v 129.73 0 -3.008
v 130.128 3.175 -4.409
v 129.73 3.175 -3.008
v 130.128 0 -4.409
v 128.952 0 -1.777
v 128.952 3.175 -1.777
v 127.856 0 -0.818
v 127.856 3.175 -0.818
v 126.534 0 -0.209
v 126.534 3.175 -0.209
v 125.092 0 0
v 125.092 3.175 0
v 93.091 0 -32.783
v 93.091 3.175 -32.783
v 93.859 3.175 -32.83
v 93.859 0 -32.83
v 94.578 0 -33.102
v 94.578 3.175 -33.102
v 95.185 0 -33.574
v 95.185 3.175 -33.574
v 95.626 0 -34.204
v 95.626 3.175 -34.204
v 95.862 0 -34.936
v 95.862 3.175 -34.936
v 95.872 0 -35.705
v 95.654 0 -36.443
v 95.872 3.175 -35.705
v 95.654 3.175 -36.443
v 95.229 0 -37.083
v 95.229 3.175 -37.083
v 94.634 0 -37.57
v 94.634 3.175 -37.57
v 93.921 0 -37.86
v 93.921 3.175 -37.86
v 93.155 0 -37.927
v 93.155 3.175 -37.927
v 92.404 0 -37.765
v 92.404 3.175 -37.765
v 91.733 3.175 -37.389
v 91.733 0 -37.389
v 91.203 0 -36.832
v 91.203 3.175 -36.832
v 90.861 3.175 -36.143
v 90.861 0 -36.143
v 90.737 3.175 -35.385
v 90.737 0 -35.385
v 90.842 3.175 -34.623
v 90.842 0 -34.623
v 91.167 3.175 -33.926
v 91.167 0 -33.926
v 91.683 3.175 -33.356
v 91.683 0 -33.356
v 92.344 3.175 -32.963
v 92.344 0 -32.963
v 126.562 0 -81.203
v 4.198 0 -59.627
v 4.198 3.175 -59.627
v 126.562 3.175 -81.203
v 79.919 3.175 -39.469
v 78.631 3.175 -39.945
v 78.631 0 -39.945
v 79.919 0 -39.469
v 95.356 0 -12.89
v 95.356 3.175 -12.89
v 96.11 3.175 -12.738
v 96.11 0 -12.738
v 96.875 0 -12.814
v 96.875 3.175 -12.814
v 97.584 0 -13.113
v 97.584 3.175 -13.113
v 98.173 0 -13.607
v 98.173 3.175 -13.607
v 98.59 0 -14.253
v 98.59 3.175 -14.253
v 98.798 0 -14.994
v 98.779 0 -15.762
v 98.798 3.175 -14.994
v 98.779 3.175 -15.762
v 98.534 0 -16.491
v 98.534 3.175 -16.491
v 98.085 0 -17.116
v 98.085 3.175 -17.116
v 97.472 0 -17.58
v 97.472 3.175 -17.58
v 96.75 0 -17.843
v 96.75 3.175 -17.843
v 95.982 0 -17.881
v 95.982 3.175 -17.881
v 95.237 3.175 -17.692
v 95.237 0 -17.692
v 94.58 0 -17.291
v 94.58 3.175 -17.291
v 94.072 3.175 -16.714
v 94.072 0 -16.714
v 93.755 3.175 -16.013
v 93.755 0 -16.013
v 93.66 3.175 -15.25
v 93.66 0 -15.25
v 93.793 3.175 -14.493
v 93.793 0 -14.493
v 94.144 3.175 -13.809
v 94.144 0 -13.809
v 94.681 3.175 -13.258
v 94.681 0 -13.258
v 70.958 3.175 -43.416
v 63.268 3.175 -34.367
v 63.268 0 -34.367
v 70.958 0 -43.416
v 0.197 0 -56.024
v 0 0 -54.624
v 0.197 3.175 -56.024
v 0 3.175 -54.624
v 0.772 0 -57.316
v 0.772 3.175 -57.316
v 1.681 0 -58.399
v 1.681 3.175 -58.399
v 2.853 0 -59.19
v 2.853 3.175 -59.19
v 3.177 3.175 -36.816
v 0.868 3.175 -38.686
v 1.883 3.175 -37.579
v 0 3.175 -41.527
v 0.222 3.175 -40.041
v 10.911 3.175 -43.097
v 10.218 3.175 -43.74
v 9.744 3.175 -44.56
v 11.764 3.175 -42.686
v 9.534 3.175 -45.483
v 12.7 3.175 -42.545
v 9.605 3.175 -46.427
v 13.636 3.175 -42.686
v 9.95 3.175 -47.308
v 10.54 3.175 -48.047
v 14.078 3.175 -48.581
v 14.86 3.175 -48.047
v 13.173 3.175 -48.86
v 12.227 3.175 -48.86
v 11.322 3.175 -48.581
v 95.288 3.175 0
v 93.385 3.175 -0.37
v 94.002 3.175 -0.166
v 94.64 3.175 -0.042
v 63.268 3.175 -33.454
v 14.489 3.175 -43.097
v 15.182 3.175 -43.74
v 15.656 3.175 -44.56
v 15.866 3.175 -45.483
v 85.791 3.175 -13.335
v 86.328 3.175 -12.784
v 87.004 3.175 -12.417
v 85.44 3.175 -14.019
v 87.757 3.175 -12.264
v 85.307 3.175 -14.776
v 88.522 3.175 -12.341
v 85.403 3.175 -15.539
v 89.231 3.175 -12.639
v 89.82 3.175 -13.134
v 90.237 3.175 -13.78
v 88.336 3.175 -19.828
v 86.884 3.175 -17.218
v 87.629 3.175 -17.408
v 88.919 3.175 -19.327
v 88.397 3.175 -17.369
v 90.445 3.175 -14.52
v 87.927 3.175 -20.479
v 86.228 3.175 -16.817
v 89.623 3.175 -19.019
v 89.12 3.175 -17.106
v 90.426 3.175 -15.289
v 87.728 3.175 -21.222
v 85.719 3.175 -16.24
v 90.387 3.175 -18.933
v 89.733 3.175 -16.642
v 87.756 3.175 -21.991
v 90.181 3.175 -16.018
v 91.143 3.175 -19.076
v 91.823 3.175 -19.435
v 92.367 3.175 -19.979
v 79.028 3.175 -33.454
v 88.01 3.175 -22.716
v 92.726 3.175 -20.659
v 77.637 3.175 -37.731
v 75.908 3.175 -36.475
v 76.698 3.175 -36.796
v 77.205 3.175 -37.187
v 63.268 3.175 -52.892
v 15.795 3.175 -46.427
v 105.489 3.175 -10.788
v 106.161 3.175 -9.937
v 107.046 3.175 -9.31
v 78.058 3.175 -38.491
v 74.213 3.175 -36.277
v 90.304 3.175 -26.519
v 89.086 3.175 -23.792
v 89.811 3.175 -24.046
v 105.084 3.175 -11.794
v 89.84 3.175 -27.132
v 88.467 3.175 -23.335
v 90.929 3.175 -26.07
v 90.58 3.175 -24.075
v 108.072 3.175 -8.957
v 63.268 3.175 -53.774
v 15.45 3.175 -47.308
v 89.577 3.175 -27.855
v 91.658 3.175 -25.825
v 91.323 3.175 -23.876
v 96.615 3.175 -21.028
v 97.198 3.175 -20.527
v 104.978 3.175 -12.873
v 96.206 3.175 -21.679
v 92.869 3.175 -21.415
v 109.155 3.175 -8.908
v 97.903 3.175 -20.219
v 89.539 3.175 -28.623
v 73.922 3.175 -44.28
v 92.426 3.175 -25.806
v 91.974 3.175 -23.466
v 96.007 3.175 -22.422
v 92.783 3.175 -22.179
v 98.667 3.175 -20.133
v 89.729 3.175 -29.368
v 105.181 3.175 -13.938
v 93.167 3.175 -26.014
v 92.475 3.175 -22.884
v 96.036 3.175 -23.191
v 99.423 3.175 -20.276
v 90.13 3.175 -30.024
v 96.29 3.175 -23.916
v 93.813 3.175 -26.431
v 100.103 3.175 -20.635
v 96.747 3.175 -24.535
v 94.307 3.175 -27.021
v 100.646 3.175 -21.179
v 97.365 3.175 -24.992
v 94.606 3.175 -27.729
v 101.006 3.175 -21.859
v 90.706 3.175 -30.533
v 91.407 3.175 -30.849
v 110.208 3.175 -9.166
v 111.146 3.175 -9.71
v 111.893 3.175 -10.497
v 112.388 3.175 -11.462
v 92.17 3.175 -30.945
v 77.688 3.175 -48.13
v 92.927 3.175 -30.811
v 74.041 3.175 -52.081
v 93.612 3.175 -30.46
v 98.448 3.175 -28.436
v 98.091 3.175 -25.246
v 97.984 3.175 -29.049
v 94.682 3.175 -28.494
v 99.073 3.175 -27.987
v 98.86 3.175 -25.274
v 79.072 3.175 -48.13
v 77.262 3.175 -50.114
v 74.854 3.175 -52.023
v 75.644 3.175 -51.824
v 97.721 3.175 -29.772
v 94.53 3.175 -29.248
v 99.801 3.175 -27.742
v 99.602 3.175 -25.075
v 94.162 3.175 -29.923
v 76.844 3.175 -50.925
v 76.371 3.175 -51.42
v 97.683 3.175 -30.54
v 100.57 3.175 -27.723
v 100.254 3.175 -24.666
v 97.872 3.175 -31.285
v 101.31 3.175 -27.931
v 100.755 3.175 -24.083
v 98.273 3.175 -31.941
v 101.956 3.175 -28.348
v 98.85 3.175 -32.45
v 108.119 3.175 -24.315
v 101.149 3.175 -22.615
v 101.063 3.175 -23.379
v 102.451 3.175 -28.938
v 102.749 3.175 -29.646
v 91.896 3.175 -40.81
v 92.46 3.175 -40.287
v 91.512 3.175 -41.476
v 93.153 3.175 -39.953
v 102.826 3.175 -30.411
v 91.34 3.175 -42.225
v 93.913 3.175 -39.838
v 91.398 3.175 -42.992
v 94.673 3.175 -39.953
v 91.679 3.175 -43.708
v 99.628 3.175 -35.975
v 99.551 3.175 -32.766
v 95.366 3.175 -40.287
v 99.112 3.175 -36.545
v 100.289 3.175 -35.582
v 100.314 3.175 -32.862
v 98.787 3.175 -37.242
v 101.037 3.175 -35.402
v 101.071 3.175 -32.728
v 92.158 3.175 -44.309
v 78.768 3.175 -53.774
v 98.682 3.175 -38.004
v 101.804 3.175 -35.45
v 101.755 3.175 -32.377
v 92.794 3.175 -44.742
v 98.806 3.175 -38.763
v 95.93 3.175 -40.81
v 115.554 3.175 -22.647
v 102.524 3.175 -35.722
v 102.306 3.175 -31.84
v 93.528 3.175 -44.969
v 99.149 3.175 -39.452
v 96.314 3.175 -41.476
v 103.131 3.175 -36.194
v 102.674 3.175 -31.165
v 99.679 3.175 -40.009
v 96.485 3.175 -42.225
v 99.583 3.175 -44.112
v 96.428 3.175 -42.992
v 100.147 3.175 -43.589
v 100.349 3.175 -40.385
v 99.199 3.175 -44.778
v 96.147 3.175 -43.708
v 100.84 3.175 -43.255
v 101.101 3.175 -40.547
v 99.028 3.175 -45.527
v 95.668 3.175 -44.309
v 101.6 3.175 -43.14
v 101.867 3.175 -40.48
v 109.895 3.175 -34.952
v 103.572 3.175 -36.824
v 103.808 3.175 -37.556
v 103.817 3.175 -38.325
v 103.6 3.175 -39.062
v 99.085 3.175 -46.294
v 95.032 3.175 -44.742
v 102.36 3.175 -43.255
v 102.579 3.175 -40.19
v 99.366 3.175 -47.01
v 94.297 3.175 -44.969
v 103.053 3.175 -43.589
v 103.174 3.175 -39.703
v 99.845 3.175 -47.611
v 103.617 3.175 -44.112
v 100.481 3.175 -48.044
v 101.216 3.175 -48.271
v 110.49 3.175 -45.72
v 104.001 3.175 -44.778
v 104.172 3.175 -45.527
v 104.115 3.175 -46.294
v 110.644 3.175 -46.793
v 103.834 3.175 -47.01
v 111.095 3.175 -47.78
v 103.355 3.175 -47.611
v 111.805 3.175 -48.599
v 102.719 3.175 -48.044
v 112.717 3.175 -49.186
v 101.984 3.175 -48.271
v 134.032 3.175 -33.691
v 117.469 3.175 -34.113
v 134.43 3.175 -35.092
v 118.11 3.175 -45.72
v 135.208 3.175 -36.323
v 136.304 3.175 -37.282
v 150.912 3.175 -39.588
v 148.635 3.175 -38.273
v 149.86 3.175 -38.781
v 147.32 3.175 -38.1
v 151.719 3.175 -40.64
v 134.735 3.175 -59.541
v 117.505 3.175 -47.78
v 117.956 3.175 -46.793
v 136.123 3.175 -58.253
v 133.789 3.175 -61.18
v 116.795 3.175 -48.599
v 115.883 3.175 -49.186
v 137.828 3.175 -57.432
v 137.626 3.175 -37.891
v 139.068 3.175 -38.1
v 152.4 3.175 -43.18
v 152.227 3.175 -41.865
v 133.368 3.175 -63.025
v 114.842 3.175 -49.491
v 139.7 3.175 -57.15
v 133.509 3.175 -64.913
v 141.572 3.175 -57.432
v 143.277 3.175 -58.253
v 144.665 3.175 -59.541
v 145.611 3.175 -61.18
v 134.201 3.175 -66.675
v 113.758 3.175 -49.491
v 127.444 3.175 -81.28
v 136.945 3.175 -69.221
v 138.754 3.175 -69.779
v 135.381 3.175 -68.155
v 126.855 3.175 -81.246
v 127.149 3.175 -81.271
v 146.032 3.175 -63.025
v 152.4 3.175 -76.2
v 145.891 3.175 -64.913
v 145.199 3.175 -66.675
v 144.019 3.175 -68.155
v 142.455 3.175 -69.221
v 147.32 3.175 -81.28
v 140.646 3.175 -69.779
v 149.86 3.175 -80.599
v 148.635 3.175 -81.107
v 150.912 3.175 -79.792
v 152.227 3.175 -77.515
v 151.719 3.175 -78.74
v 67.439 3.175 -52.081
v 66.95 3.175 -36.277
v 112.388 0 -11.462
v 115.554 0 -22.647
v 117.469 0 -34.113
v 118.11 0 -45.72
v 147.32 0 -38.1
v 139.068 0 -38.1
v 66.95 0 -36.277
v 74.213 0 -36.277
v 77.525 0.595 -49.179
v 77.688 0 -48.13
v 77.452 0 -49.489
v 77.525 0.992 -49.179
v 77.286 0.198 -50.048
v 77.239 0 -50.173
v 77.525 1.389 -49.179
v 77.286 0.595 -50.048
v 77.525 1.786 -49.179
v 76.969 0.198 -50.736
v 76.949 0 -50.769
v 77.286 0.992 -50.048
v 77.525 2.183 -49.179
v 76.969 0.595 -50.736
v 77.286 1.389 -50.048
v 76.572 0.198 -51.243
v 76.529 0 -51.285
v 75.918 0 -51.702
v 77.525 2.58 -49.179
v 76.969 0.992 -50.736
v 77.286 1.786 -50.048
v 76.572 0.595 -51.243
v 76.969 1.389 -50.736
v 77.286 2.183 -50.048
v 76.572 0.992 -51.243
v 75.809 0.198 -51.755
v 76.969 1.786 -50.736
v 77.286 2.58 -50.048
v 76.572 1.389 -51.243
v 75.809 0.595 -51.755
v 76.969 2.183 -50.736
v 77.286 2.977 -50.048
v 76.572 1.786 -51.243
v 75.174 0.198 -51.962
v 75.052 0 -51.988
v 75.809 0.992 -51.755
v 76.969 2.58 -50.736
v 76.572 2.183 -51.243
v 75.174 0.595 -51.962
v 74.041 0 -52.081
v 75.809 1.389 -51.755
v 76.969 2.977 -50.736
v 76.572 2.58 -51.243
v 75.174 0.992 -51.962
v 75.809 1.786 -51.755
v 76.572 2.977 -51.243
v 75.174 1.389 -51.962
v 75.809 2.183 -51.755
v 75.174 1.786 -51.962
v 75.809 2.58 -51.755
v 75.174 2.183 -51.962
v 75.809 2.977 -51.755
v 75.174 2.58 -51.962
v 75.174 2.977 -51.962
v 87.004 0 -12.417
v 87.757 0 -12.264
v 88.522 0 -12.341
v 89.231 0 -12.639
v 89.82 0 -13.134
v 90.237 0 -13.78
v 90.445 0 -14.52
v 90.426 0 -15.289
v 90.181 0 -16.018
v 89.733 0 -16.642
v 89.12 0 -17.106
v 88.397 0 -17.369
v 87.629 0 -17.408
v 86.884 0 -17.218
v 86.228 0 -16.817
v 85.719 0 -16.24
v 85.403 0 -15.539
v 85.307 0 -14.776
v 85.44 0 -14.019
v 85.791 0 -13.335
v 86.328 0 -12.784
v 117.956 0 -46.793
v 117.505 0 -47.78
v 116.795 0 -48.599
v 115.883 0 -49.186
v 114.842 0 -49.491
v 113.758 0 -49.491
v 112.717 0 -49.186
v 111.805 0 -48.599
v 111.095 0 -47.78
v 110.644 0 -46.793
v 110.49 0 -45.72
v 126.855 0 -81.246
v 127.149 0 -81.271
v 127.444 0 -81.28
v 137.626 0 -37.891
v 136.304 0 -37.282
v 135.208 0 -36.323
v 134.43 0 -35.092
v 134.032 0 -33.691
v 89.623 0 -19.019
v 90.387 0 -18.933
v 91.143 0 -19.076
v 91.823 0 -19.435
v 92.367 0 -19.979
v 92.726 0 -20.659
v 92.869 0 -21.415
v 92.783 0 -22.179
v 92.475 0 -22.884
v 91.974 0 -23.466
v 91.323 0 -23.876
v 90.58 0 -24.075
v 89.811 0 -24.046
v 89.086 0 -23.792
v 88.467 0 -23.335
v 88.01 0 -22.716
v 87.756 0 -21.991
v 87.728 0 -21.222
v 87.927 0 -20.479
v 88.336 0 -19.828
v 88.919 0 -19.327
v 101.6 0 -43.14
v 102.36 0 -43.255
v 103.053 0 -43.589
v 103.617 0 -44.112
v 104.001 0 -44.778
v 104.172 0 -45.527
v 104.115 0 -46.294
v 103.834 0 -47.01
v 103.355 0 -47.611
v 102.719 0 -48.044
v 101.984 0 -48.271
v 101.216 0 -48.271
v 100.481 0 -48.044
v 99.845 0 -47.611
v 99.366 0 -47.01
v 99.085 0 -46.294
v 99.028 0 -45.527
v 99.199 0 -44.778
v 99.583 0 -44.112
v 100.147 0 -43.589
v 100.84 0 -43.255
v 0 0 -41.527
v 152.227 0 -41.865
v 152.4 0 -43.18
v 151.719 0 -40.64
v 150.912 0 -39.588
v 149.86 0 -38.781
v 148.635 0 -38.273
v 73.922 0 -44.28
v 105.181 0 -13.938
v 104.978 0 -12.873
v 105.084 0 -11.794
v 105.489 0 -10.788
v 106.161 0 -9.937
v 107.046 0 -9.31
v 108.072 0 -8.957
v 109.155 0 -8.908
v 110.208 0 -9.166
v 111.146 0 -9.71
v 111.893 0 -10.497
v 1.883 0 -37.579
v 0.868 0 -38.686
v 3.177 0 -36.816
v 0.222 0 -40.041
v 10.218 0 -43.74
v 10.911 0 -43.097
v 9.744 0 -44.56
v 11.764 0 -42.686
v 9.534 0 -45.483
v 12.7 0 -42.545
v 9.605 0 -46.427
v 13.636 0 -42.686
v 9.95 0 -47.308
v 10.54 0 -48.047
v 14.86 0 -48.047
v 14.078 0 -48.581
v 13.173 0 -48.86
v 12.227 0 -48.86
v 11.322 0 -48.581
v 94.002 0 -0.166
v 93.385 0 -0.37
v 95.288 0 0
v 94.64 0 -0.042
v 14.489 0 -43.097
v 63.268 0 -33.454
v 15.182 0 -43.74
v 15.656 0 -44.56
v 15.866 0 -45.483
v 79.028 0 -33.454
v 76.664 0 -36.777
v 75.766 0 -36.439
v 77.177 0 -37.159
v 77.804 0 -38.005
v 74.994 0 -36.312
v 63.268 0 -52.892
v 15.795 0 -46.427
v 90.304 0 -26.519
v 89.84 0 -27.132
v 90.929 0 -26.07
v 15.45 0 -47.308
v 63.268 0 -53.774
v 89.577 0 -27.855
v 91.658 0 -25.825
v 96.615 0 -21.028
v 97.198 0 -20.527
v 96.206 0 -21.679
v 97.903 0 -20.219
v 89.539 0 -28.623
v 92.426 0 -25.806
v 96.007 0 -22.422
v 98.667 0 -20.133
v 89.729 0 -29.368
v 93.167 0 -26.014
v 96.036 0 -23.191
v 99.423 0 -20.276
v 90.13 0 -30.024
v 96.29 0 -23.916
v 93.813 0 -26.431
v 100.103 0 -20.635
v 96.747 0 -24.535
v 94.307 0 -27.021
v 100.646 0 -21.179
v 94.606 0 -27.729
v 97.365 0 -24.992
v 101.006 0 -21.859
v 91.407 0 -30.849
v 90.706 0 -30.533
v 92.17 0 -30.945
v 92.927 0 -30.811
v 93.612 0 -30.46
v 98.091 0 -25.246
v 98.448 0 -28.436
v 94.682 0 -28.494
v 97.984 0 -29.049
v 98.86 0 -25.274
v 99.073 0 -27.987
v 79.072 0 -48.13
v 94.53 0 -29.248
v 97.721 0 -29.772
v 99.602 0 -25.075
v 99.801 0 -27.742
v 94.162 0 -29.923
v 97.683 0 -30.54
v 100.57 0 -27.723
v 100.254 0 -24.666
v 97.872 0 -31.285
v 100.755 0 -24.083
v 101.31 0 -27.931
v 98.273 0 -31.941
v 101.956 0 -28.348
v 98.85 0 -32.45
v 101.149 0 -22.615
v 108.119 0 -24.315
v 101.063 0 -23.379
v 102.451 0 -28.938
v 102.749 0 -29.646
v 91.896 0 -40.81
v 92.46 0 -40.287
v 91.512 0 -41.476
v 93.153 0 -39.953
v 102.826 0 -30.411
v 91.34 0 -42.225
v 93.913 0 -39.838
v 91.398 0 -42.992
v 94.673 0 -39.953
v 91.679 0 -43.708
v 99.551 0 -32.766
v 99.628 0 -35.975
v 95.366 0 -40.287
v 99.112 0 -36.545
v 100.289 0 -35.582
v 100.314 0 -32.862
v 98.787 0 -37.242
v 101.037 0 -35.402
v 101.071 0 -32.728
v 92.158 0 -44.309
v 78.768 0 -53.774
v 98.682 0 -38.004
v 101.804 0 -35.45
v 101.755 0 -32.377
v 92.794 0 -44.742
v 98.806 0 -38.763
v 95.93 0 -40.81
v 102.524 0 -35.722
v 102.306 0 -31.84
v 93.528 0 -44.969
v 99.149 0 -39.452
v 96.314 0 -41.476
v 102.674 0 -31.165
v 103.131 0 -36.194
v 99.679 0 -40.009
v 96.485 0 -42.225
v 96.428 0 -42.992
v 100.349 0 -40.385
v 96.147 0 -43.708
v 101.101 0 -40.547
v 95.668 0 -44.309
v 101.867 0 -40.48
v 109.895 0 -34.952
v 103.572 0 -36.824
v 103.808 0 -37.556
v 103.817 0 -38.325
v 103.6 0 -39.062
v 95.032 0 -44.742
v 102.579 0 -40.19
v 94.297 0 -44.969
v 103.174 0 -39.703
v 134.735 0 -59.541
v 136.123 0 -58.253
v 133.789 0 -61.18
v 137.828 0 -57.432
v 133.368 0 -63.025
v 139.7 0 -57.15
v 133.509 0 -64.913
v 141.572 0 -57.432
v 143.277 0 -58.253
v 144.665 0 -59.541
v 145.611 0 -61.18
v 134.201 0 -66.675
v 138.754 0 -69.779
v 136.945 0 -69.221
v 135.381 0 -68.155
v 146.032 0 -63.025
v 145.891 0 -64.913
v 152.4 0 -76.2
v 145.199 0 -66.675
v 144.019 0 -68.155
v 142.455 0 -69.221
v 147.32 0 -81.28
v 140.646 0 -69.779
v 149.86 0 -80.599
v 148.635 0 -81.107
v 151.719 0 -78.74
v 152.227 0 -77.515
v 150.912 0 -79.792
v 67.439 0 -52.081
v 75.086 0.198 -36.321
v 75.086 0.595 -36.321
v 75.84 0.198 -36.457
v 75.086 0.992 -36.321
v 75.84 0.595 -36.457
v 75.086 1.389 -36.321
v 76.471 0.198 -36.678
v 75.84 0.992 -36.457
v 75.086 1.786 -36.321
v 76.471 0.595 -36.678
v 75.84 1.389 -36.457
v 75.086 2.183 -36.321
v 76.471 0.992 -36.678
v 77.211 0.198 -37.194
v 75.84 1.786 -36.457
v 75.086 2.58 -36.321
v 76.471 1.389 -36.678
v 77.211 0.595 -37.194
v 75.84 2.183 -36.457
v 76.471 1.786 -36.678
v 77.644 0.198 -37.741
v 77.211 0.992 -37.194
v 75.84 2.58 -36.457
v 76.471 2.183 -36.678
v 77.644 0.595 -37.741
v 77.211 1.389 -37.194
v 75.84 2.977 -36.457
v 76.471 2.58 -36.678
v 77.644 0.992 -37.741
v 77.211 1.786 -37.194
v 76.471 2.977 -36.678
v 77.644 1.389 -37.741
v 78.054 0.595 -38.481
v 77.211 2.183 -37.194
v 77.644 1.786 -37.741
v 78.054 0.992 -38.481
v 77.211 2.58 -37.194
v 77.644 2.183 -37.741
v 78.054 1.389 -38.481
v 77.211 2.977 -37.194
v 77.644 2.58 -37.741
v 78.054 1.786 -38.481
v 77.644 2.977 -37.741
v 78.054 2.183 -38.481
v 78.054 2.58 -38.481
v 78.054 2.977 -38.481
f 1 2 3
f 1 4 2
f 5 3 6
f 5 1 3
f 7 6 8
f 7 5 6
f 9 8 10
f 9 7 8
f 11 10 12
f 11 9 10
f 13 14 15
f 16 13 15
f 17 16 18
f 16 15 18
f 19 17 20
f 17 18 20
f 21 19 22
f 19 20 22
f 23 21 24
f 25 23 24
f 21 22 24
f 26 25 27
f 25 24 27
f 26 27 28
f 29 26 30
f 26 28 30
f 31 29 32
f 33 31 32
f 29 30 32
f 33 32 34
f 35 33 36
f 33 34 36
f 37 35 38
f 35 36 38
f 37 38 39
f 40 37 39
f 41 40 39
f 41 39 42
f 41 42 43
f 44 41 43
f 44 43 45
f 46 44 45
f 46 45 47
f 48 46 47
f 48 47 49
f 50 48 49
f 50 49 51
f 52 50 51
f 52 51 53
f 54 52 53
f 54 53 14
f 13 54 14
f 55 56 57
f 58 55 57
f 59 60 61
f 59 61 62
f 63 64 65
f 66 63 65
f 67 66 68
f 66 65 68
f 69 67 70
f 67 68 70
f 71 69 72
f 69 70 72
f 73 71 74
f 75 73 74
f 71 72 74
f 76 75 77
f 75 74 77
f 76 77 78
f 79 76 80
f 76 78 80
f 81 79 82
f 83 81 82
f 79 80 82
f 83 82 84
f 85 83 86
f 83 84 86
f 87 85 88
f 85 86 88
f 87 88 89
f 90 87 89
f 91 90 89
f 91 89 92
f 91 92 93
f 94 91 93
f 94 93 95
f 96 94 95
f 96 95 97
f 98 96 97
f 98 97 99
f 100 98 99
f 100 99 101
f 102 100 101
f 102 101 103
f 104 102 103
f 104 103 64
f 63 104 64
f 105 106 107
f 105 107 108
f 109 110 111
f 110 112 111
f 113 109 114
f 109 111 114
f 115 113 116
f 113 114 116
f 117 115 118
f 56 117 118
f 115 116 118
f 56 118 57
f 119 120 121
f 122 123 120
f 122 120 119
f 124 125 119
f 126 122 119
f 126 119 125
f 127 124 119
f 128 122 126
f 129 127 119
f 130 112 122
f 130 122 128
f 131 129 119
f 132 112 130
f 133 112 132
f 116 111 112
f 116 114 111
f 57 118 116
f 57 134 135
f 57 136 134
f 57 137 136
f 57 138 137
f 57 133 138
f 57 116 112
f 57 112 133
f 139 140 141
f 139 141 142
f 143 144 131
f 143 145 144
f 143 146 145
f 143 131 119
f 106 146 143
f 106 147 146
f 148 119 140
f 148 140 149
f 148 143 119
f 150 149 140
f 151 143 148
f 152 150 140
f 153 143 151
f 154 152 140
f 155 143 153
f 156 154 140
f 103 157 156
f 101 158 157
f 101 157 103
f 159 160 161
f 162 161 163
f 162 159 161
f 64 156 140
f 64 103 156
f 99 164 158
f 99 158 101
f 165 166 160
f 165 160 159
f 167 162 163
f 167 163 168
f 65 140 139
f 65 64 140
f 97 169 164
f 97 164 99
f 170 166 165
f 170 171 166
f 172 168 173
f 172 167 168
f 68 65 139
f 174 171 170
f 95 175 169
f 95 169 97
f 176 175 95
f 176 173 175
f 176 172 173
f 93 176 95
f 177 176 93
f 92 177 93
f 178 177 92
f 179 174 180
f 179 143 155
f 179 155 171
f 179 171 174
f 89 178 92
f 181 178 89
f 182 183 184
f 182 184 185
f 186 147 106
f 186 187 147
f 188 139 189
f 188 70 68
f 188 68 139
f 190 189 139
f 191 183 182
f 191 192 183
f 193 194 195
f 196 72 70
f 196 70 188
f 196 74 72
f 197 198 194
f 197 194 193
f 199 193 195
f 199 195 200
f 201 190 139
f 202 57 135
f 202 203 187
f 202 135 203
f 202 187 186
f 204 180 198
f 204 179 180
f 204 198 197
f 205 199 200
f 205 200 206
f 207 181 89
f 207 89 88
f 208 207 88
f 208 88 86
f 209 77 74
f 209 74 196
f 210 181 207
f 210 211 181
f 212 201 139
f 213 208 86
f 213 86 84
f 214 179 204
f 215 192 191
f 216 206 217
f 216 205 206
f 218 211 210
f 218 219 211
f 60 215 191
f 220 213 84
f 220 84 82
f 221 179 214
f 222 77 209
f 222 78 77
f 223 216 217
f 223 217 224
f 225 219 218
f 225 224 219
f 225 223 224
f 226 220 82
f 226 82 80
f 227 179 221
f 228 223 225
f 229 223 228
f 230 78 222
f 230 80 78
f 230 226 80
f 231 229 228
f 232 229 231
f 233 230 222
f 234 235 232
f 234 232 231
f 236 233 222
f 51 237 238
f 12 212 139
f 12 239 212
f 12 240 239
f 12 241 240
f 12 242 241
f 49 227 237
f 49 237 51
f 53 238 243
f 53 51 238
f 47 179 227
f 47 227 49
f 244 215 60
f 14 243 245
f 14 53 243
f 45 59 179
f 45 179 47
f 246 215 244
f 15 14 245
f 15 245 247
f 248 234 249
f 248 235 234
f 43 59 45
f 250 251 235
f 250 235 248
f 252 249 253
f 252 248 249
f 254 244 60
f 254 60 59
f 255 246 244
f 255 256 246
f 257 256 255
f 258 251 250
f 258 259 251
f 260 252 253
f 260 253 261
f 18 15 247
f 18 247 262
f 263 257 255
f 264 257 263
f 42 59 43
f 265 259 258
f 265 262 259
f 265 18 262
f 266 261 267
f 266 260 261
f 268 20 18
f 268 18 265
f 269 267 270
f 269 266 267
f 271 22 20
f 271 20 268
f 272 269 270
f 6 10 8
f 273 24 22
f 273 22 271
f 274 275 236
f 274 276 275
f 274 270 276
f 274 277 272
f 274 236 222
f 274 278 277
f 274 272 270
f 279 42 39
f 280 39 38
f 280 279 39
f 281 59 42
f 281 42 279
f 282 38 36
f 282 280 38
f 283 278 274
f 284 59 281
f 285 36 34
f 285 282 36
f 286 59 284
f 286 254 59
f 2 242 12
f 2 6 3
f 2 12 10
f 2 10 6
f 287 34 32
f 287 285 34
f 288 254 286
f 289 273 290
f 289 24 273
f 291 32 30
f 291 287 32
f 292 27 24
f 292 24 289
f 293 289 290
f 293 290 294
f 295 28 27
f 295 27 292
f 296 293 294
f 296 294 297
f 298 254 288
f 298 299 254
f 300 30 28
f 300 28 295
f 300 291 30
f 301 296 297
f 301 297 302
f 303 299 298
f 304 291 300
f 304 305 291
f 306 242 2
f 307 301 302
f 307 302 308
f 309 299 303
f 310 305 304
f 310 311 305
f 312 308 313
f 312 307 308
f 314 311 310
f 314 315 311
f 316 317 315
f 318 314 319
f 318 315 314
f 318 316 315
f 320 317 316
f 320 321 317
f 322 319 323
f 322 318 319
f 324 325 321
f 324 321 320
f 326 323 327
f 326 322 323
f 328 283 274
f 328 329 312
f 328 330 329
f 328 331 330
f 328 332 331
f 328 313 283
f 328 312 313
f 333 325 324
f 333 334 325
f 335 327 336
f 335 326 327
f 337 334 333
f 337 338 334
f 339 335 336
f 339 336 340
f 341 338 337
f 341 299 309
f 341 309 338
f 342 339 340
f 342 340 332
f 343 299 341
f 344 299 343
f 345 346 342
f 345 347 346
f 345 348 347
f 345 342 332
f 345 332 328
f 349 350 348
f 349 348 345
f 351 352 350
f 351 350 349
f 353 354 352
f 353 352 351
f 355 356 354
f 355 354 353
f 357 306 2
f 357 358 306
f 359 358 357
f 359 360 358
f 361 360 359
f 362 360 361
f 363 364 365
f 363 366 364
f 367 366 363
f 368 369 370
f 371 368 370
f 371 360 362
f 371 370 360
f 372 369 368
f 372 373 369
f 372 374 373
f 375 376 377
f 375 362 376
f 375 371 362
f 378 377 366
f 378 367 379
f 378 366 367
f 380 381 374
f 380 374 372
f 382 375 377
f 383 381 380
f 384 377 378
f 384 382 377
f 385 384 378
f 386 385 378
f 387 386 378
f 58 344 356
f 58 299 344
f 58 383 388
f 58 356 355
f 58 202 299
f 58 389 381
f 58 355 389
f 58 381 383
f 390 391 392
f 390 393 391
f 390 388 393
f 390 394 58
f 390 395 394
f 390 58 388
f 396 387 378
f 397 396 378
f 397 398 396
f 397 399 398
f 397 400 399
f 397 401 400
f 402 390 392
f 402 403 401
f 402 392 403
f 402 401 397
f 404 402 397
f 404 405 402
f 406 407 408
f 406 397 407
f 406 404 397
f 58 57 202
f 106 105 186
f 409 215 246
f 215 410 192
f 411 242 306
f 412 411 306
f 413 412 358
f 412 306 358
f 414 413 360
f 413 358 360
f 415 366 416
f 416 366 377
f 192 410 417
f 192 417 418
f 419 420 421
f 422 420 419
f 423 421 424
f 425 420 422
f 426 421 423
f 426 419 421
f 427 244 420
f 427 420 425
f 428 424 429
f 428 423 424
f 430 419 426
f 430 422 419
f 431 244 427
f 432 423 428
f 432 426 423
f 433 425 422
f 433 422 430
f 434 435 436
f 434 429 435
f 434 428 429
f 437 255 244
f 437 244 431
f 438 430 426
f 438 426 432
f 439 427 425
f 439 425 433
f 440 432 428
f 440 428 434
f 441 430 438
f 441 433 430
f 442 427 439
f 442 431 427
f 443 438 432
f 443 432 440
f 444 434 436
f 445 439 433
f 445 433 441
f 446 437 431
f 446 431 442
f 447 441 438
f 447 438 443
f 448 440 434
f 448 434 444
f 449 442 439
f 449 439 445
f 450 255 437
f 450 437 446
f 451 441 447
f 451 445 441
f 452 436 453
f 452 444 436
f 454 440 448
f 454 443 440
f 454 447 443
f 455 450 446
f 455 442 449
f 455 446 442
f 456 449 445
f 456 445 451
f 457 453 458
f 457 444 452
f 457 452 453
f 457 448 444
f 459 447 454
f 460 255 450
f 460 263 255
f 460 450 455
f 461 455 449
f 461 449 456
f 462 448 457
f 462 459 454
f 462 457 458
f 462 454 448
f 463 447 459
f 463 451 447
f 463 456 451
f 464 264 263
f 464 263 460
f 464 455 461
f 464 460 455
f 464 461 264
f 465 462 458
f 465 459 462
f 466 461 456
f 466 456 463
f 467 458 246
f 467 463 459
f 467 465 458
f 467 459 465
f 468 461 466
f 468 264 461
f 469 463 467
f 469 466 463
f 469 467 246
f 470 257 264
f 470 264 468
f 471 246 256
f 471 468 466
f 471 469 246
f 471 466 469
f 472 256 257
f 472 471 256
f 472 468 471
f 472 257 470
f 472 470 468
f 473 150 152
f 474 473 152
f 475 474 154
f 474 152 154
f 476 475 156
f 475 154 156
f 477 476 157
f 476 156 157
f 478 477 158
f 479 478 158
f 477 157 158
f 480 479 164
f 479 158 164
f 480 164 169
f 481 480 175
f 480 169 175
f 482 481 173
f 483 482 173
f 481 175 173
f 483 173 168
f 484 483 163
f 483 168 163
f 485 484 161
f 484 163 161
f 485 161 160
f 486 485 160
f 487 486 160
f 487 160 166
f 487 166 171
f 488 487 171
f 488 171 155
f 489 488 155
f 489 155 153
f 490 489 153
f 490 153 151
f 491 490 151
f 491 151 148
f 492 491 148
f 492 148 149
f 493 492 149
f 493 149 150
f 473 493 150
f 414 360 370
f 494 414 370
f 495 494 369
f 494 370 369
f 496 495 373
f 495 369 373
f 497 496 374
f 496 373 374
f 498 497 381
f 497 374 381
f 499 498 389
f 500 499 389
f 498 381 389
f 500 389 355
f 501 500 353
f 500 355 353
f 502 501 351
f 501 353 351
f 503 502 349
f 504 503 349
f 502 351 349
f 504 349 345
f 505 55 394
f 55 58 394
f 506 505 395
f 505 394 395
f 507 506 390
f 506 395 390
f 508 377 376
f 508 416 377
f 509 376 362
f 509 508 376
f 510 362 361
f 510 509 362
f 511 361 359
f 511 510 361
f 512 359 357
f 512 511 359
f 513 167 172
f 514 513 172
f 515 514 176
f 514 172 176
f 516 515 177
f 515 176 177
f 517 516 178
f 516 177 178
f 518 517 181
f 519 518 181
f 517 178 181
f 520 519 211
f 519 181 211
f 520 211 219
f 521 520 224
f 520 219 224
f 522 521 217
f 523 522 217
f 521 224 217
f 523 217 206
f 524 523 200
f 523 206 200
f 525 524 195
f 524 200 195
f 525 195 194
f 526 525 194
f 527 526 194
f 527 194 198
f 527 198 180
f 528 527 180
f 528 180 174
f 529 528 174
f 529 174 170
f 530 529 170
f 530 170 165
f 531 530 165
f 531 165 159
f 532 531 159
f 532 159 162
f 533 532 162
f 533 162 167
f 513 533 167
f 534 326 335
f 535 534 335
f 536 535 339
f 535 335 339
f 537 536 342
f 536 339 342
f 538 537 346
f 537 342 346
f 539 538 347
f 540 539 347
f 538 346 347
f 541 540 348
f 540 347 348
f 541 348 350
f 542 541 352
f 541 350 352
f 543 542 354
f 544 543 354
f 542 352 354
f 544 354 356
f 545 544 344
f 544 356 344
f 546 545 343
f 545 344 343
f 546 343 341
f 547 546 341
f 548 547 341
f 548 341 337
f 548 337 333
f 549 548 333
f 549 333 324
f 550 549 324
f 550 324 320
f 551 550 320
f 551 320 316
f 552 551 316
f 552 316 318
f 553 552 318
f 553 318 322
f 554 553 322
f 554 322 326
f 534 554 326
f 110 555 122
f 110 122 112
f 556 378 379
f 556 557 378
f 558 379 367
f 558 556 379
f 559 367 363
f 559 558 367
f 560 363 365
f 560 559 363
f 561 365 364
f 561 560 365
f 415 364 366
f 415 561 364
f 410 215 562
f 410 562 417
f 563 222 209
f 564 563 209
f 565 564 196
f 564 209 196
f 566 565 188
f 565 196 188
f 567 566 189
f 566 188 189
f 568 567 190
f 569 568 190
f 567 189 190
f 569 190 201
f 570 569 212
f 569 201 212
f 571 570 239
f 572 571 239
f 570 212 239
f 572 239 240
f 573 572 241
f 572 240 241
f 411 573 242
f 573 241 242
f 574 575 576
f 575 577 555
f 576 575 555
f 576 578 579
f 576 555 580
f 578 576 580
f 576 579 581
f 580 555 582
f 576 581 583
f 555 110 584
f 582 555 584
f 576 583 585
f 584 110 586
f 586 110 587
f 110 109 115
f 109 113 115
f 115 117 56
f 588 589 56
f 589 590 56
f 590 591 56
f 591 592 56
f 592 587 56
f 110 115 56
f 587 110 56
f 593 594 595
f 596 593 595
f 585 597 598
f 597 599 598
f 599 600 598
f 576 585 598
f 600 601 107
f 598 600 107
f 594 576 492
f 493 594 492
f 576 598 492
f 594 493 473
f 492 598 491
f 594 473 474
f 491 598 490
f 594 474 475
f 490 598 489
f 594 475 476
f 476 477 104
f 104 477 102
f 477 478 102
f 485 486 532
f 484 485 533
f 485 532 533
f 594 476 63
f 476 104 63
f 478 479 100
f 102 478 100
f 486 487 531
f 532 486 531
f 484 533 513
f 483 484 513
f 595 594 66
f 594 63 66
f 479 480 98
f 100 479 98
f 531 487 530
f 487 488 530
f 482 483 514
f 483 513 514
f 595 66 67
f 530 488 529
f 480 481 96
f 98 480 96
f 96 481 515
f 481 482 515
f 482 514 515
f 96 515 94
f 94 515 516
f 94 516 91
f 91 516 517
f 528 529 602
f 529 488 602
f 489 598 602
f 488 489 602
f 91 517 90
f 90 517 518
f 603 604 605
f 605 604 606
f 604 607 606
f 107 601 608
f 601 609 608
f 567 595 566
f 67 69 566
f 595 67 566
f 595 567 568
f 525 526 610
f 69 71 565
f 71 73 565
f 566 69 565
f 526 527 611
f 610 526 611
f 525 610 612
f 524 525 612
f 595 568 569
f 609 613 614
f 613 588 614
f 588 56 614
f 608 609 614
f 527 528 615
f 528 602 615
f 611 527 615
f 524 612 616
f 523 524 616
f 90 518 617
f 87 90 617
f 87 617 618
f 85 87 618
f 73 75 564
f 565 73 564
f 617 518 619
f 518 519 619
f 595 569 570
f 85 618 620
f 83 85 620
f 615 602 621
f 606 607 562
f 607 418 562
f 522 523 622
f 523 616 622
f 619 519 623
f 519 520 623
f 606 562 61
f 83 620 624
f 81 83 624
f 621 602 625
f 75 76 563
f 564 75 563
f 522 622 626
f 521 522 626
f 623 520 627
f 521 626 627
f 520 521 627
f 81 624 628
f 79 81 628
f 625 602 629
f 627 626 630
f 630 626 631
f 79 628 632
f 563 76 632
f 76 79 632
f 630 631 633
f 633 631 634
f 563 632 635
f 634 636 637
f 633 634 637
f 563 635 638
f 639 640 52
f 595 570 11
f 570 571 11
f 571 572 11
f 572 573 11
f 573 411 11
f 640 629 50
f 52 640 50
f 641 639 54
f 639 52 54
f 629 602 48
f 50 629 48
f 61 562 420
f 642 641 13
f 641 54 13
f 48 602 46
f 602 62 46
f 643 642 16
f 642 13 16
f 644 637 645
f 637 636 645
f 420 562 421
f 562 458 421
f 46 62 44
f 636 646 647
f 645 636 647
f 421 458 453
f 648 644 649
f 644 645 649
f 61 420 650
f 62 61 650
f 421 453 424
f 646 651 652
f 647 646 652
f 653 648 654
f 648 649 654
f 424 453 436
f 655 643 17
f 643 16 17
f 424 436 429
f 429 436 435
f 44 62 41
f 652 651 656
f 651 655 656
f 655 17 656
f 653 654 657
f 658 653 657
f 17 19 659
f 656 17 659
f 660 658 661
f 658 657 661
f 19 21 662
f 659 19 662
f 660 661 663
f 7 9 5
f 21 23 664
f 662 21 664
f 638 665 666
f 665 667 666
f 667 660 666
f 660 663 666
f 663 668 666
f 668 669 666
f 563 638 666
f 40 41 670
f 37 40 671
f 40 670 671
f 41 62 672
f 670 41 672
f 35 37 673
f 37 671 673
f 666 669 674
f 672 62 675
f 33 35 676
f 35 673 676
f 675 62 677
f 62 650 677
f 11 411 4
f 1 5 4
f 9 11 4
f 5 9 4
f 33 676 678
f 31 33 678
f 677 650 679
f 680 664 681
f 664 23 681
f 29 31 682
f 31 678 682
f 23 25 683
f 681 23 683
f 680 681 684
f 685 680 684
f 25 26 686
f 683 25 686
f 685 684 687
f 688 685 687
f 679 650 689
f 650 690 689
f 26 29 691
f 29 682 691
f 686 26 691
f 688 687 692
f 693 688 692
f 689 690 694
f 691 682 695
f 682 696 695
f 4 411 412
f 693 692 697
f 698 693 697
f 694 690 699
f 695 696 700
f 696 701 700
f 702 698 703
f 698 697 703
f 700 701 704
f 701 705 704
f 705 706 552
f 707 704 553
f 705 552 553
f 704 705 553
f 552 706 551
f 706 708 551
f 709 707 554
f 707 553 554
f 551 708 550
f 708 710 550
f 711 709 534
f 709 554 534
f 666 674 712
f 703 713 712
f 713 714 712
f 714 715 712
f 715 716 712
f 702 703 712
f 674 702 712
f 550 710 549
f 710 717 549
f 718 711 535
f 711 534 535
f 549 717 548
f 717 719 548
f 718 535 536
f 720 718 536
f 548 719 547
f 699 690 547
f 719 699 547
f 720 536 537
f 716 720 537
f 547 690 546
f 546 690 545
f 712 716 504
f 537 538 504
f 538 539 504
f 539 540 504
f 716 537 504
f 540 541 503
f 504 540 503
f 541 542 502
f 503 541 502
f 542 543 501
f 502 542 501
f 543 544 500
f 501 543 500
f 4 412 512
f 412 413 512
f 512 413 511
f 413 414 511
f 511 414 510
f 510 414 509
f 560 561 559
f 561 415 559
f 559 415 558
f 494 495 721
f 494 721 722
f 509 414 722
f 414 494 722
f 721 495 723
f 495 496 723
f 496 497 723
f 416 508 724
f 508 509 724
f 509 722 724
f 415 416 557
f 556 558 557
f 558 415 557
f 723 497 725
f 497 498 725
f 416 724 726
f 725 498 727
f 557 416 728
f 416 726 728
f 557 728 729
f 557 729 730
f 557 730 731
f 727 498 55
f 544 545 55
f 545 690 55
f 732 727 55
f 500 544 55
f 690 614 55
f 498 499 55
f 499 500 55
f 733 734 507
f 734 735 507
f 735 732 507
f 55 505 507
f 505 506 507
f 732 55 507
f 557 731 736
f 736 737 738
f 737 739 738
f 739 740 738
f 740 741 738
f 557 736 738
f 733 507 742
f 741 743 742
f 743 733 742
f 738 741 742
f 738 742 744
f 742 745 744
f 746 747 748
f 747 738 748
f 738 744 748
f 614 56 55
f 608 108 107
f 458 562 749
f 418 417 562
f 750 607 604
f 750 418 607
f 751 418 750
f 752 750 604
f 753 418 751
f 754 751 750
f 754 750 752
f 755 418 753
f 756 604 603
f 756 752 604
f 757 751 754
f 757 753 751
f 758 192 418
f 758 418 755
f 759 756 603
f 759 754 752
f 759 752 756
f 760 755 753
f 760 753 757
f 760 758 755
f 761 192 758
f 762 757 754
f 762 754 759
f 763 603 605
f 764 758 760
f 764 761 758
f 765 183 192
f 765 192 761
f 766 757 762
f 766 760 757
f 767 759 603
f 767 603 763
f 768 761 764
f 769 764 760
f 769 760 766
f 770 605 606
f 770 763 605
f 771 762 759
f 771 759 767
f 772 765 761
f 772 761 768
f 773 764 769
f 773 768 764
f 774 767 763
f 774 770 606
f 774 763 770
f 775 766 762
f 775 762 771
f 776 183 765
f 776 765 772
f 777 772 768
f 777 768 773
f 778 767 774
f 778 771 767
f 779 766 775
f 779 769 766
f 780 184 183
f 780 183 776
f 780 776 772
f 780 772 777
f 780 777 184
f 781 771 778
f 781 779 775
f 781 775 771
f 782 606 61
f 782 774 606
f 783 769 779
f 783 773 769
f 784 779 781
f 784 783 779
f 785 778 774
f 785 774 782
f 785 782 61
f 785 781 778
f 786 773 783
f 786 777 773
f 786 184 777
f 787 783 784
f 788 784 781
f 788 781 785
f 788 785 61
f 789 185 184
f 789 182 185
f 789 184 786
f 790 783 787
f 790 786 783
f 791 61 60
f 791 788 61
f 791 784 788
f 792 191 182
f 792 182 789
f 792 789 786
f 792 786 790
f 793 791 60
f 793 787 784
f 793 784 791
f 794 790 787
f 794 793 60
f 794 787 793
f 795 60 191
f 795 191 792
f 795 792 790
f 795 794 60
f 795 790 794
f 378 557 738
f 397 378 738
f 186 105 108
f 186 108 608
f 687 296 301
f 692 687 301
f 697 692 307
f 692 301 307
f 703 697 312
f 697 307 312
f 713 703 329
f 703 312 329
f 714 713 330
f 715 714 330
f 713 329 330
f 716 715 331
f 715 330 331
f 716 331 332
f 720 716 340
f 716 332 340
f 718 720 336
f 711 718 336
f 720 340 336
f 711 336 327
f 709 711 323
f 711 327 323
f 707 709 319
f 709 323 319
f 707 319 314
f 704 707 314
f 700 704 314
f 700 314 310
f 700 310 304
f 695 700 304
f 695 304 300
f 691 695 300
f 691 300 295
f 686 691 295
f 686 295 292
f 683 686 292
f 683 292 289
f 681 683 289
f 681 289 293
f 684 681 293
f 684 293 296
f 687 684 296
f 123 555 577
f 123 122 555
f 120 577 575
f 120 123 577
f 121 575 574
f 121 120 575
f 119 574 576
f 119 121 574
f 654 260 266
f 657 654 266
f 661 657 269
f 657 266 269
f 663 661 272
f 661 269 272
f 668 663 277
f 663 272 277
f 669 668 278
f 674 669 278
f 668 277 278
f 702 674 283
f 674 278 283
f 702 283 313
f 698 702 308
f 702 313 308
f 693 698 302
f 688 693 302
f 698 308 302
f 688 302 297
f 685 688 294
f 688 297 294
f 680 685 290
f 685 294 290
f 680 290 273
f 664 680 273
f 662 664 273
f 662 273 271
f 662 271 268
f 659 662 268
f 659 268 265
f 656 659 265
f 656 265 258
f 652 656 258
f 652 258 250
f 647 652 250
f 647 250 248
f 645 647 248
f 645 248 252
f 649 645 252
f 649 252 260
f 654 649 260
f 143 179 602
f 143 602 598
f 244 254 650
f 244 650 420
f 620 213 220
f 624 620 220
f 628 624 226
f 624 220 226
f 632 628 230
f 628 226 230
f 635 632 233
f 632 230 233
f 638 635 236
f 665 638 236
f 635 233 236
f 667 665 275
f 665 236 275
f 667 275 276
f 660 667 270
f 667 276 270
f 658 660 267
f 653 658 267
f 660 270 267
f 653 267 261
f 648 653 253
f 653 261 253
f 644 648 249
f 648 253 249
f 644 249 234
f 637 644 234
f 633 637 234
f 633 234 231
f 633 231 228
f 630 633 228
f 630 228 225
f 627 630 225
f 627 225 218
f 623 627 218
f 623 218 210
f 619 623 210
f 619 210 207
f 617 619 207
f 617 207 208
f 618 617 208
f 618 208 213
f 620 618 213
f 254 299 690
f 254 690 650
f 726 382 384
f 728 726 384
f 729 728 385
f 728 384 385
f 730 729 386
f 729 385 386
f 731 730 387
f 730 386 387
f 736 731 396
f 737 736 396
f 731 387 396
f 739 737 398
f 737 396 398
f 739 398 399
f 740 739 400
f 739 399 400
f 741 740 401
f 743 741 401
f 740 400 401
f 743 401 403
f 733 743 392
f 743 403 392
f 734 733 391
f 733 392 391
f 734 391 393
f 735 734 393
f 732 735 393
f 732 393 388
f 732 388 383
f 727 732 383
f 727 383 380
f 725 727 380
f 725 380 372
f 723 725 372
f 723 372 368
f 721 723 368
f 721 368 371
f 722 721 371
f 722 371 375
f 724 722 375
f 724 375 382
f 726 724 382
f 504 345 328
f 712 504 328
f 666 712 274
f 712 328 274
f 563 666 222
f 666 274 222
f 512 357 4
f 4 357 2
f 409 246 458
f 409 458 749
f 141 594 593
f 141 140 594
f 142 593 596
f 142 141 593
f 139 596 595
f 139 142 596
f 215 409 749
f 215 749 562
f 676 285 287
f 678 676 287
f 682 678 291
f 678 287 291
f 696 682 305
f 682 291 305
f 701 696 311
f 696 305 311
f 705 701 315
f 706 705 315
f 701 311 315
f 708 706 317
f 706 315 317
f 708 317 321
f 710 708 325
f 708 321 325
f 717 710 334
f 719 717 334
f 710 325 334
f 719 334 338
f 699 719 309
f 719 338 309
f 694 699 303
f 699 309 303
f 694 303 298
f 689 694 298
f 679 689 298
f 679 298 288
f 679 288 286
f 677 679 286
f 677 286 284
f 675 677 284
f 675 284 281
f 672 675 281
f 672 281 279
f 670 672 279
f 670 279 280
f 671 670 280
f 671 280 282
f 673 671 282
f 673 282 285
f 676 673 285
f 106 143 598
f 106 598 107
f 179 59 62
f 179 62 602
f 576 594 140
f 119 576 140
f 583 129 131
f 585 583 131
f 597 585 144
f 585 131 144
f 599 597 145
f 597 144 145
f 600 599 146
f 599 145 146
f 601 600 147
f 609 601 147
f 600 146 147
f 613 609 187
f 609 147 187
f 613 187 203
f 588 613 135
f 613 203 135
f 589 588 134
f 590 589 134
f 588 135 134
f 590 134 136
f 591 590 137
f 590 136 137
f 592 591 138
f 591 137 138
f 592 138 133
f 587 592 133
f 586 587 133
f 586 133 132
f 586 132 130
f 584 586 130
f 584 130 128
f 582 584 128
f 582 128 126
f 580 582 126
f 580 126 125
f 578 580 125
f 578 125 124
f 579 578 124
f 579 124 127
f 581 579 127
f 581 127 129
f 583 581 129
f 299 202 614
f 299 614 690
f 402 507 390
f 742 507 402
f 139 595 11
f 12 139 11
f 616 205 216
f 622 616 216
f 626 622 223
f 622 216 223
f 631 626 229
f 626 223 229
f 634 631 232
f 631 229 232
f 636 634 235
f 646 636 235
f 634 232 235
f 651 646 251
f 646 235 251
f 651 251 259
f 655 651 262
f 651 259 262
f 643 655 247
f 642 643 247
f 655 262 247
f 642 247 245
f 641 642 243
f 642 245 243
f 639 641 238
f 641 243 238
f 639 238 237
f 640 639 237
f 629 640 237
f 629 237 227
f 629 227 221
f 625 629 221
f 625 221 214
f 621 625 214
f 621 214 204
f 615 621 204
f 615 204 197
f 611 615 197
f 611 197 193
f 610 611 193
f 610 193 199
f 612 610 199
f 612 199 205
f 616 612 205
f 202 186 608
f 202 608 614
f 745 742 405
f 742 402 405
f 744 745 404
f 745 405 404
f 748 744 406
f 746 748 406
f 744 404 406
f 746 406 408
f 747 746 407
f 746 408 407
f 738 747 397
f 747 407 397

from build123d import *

# Parameters (mm, degrees)
SKETCH1_W           = 152.4
SKETCH1_H           = 81.28
BOSS_EXTRUDE1_DEPTH = 3.175
SKETCH2_R           = 3.175
SKETCH2_R_2         = 6.35
CUT_EXTRUDE1_DEPTH  = 173.74917952
CHAMFER1_SIZE       = 38.1
CHAMFER1_SIZE2      = 94.300809115
CHAMFER2_SIZE       = 127
CHAMFER2_SIZE2      = 22.39352655
CUT_EXTRUDE2_DEPTH  = 173.74917952
FILLET1_R           = 5.08
CUT_EXTRUDE3_DEPTH  = 173.74917952
SKETCH5_R           = 2.5796875
CUT_EXTRUDE4_DEPTH  = 173.749179658
CIRPATTERN1_COUNT   = 5
CIRPATTERN1_ANGLE   = 20


with BuildPart() as part:
    # Sketch1 → Boss-Extrude1 (new body)
    with BuildSketch(Plane(origin=(0, 0, 0), x_dir=(1, 0, 0), z_dir=(0, 1, 0))):
        with Locations((76.2, 40.64)):
            Rectangle(SKETCH1_W, SKETCH1_H)
    extrude(amount=BOSS_EXTRUDE1_DEPTH)

    # Sketch2 → Cut-Extrude1 (cut, through all)
    with BuildSketch(Plane(origin=(0, 3.175, 0), x_dir=(1, 0, 0), z_dir=(0, 1, 0))):
        with Locations(Location((12.7, 45.72, 0), (0, 0, 270))):
            Circle(SKETCH2_R)
        with Locations(Location((139.7, 63.5, 0), (0, 0, 270))):
            Circle(SKETCH2_R_2)
        with BuildLine():
            ThreePointArc((118.11, 45.72), (114.3, 49.53), (110.49, 45.72))
            ThreePointArc((110.49, 45.72), (109.15371332, 29.608970028), (105.181373622, 13.93825))
            ThreePointArc((105.181373622, 13.93825), (107.546294022, 9.096829599), (112.387714423, 11.46175))
            ThreePointArc((112.387714423, 11.46175), (116.669587085, 28.353565095), (118.11, 45.72))
        make_face()
    extrude(amount=-CUT_EXTRUDE1_DEPTH, mode=Mode.SUBTRACT)

    # Chamfer1
    chamfer1_edges = [part.edges().sort_by_distance(p)[0] for p in [
        (0, 1.5875, 0),
    ]]
    chamfer1_side = [part.faces().sort_by_distance(p)[0] for p in [
        (0, 1.5875, -40.64),
    ]]
    chamfer(chamfer1_edges, length=CHAMFER1_SIZE, length2=CHAMFER1_SIZE2, reference=chamfer1_side[0])

    # Chamfer2
    chamfer2_edges = [part.edges().sort_by_distance(p)[0] for p in [
        (0, 1.5875, -81.28),
    ]]
    chamfer2_side = [part.faces().sort_by_distance(p)[0] for p in [
        (76.2, 1.5875, -81.28),
    ]]
    chamfer(chamfer2_edges, length=CHAMFER2_SIZE, length2=CHAMFER2_SIZE2, reference=chamfer2_side[0])

    # Sketch3 → Cut-Extrude2 (cut, through all)
    with BuildSketch(Plane(origin=(0, 3.175, 0), x_dir=(1, 0, 0), z_dir=(0, 1, 0))):
        Polygon((134.62, 38.1), (129.54, 0), (152.4, 0), (152.4, 38.1), align=None)
    extrude(amount=-CUT_EXTRUDE2_DEPTH, mode=Mode.SUBTRACT)

    # Fillet1
    fillet1_edges = [part.edges().sort_by_distance(p)[0] for p in [
        (94.300809115, 1.5875, 0),
        (0, 1.5875, -38.1),
        (0, 1.5875, -58.88647345),
        (127, 1.5875, -81.28),
        (152.4, 1.5875, -38.1),
        (129.54, 1.5875, 0),
        (134.62, 1.5875, -38.1),
        (152.4, 1.5875, -81.28),
    ]]
    fillet(fillet1_edges, radius=FILLET1_R)

    # Sketch4 → Cut-Extrude3 (cut, through all)
    with BuildSketch(Plane(origin=(0, 3.175, 0), x_dir=(1, 0, 0), z_dir=(0, 1, 0))):
        with BuildLine():
            Line((79.02824603, 33.454322708), (63.267898808, 33.454322708))
            Line((63.267898808, 33.454322708), (63.267898808, 34.367135208))
            Line((63.267898808, 34.367135208), (70.958454364, 43.415885208))
            Line((70.958454364, 43.415885208), (63.267898808, 52.892378263))
            Line((63.267898808, 52.892378263), (63.267898808, 53.774322708))
            Line((63.267898808, 53.774322708), (78.768072419, 53.774322708))
            Line((78.768072419, 53.774322708), (79.072343253, 48.129878263))
            Line((79.072343253, 48.129878263), (77.687690475, 48.129878263))
            add(Edge.make_bspline(
                [(77.687690475, 48.129878263), (77.666267335, 48.312443932), (77.624982011, 48.664272977), (77.531920072, 49.166102178), (77.421008935, 49.62371596), (77.297338484, 50.038468153), (77.145364304, 50.406140244), (76.981241456, 50.731622206), (76.788125584, 51.007791949), (76.57914231, 51.245843364), (76.346452552, 51.448106373), (76.086781148, 51.614145073), (75.807782072, 51.761949969), (75.502009403, 51.881996436), (75.169445928, 51.96657961), (74.814820872, 52.034378559), (74.435667298, 52.073714003), (74.174700115, 52.078522896), (74.040850197, 52.080989374)],
                knots=[0, 0, 0, 0, 1.445989141, 2.78661909, 4.012434194, 5.150135165, 6.187474348, 7.139280037, 8.011906442, 8.831168962, 9.626489899, 10.428426412, 11.250947746, 12.10787495, 13.005585407, 13.946934481, 14.94698387, 16, 16, 16, 16], degree=3))
            Line((74.040850197, 52.080989374), (67.43949603, 52.080989374))
            Line((67.43949603, 52.080989374), (73.921787697, 44.280190763))
            Line((73.921787697, 44.280190763), (66.950016864, 36.27654493))
            Line((66.950016864, 36.27654493), (74.212829364, 36.27654493))
            add(Edge.make_bspline(
                [(74.212829364, 36.27654493), (74.36279346, 36.279802671), (74.654213785, 36.286133332), (75.077264171, 36.314305601), (75.470658519, 36.371763784), (75.832477573, 36.452086018), (76.16654489, 36.545672831), (76.468216936, 36.671559846), (76.742753798, 36.815646486), (76.99291299, 36.987221798), (77.223304318, 37.196939313), (77.442312889, 37.449316269), (77.65608094, 37.749183515), (77.859903069, 38.097852765), (78.063918522, 38.491956646), (78.259688528, 38.933240259), (78.457090359, 39.41997208), (78.571649199, 39.765370609), (78.63137103, 39.945433819)],
                knots=[0, 0, 0, 0, 1.136055194, 2.207658906, 3.209008574, 4.143648749, 5.013803629, 5.832513146, 6.614441668, 7.358687952, 8.123305807, 8.967432535, 9.885009082, 10.908395979, 12.023751854, 13.244578613, 14.563543328, 16, 16, 16, 16], degree=3))
            Line((78.63137103, 39.945433819), (79.919009919, 39.469183819))
            Line((79.919009919, 39.469183819), (79.02824603, 33.454322708))
        make_face()
    extrude(amount=-CUT_EXTRUDE3_DEPTH, mode=Mode.SUBTRACT)

    # Sketch5 → Cut-Extrude4 (cut, through all)
    with BuildSketch(Plane(origin=(0, 3.175, 0), x_dir=(1, 0, 0), z_dir=(0, 1, 0))):
        with Locations(Location((101.6, 45.72, 0), (0, 0, 270))):
            Circle(SKETCH5_R)
        with Locations(Location((93.912900428, 42.418, 0), (0, 0, 270))):
            Circle(SKETCH5_R)
    cut_extrude4 = extrude(amount=-CUT_EXTRUDE4_DEPTH, mode=Mode.SUBTRACT)

    # CirPattern1: Cut-Extrude4 ×5 about axis
    cirpattern1_axis = Axis((12.7, 0, -45.72), (0, -1, 0))
    for i in range(1, CIRPATTERN1_COUNT):
        add(cut_extrude4.rotate(cirpattern1_axis, i * CIRPATTERN1_ANGLE / (CIRPATTERN1_COUNT - 1)), mode=Mode.SUBTRACT)


solid = part.part
